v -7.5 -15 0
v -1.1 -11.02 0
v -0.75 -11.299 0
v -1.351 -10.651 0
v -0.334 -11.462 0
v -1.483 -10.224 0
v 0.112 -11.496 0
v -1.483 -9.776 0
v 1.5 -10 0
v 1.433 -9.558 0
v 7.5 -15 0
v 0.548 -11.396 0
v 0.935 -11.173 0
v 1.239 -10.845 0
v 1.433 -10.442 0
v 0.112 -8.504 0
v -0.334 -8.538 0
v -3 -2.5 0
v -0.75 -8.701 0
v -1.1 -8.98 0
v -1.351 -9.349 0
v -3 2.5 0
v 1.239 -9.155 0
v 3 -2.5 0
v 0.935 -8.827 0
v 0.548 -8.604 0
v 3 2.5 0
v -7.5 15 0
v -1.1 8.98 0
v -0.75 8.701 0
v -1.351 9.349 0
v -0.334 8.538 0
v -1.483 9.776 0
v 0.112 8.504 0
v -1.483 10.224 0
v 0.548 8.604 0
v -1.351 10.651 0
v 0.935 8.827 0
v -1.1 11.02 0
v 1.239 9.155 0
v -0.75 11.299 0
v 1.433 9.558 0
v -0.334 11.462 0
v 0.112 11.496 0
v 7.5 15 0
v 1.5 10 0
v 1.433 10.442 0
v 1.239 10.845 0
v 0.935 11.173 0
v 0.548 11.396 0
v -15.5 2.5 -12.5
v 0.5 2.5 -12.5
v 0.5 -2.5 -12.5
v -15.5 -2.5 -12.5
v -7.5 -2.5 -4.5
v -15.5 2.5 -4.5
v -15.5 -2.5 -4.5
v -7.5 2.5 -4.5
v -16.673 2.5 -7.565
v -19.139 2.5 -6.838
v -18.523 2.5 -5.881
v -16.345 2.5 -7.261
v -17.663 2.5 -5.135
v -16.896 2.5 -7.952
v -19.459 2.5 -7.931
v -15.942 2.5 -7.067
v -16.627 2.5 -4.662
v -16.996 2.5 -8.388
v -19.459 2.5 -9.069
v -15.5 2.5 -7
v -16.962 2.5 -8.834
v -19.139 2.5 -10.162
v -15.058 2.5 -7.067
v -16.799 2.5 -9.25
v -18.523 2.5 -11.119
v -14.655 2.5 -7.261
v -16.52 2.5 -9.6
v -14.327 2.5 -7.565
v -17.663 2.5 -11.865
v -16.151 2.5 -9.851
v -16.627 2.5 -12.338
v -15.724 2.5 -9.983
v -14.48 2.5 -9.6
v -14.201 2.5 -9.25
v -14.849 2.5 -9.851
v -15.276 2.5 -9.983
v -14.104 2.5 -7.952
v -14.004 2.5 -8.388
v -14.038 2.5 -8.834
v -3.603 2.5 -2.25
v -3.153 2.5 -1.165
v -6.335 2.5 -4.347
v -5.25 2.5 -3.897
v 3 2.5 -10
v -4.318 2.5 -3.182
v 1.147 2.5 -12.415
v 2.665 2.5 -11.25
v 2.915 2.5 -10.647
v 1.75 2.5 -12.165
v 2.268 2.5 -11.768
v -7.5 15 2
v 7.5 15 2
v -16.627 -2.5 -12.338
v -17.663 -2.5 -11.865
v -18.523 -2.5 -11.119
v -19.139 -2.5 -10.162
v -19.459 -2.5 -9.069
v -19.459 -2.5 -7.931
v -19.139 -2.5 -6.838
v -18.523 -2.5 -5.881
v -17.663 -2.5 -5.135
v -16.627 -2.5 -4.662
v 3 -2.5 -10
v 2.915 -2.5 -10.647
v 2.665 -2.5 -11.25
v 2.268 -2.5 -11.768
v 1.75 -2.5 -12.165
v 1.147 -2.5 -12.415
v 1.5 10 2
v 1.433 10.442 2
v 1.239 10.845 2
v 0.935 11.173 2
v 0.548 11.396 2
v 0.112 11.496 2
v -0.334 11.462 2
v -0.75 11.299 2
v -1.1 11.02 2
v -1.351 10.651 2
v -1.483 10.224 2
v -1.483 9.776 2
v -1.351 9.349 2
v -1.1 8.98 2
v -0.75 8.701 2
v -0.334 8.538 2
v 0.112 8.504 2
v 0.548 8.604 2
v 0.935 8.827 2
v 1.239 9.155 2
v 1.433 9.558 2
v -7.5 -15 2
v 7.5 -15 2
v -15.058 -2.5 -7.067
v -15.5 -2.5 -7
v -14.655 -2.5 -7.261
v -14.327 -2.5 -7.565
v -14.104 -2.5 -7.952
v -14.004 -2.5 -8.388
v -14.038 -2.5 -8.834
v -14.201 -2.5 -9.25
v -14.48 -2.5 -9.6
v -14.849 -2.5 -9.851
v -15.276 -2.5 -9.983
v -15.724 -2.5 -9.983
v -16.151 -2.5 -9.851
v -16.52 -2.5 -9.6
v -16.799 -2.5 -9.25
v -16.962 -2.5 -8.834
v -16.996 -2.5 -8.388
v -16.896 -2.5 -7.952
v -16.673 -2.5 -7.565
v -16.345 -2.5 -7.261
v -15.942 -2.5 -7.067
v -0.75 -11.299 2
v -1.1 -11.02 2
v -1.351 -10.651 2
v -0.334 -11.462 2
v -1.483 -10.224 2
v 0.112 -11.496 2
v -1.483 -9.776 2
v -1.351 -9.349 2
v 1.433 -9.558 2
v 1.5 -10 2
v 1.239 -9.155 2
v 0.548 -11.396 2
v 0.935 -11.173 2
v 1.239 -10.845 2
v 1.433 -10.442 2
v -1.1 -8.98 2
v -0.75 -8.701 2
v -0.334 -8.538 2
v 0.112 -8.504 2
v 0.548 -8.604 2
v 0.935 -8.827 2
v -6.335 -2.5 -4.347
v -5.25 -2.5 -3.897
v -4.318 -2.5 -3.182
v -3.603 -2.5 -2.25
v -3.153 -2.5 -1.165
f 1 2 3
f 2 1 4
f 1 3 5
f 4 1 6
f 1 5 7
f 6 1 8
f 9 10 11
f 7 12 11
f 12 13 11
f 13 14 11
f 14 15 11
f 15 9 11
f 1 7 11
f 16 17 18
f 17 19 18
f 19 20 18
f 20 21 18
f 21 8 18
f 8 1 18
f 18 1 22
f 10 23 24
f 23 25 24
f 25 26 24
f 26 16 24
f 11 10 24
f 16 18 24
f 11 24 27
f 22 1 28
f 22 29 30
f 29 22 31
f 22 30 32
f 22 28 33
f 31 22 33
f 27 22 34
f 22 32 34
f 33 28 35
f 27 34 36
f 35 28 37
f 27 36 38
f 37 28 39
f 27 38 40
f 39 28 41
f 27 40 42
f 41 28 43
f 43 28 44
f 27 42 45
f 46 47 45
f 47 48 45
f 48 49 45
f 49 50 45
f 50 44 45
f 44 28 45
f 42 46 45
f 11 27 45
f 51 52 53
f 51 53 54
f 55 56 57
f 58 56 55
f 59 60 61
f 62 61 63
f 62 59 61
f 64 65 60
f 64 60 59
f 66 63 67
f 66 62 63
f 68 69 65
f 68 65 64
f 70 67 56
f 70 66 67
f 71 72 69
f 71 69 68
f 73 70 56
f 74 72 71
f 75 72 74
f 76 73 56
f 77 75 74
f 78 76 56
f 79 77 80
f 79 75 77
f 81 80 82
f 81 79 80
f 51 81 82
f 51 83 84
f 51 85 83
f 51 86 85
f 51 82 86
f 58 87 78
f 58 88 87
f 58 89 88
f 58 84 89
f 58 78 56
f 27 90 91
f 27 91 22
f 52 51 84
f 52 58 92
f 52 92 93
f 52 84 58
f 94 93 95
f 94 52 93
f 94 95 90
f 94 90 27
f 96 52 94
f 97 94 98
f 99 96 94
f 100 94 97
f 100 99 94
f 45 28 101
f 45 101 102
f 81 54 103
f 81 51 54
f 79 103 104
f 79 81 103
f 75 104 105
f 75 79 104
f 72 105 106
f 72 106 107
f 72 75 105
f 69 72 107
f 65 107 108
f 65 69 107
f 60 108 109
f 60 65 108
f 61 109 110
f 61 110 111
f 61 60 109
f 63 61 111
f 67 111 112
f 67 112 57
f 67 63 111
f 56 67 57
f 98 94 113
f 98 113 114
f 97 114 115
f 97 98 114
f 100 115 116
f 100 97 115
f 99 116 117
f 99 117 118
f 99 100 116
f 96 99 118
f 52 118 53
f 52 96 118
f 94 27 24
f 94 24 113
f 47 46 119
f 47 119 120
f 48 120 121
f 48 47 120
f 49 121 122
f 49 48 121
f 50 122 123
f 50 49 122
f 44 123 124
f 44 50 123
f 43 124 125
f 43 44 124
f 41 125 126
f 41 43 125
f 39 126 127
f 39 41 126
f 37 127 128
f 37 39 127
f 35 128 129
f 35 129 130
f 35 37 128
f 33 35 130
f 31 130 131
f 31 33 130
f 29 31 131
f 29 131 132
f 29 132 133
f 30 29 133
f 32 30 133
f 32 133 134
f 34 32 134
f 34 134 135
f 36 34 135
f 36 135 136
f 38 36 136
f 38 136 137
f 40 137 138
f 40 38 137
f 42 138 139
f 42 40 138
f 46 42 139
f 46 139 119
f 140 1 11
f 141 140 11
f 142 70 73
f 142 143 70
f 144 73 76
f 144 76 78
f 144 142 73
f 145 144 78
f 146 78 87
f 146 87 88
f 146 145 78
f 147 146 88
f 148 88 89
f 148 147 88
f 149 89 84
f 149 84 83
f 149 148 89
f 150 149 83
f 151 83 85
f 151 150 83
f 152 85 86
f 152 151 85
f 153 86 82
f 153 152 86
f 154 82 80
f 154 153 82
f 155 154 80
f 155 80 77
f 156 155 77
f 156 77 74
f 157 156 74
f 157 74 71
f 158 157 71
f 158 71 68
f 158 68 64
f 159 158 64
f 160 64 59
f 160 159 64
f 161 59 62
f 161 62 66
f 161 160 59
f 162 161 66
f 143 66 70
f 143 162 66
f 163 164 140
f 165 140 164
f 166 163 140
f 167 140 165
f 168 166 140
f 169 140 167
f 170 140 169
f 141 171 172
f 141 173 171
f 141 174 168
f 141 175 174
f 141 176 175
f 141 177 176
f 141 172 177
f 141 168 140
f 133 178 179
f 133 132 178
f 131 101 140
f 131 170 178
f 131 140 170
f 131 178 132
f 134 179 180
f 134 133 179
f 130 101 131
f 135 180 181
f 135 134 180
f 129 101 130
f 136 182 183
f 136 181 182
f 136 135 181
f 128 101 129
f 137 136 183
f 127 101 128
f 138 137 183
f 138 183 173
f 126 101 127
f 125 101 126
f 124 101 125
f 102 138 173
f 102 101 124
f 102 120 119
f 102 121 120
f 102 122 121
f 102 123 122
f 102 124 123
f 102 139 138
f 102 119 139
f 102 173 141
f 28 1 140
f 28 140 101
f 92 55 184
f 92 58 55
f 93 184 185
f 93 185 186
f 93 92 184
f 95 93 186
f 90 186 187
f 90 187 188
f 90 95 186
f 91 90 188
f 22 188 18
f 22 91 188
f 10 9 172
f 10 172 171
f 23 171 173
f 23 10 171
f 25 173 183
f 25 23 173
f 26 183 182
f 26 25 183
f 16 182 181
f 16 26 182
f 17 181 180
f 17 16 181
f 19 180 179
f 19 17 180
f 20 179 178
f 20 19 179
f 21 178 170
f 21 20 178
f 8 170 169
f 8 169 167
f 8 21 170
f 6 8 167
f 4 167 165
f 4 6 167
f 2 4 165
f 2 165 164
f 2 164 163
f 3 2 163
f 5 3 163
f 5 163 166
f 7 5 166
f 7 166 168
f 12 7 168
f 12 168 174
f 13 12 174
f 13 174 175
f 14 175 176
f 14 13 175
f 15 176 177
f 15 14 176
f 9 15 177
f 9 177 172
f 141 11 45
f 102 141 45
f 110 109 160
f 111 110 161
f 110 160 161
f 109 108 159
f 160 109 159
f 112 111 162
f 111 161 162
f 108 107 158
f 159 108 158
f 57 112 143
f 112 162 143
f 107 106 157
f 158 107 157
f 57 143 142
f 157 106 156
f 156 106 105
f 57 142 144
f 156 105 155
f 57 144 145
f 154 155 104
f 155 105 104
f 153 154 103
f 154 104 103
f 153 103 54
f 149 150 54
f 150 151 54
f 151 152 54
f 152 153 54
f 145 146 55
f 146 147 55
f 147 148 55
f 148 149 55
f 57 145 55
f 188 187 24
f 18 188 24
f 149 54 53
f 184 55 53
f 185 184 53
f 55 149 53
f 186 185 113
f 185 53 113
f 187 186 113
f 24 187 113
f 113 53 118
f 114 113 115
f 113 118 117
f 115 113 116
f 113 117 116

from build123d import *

# Parameters (mm, degrees)
SKETCH1_W           = 15
SKETCH1_H           = 30
SKETCH1_R           = 1.5
BOSS_EXTRUDE1_DEPTH = 2
SKETCH2_R           = 1.5
BOSS_EXTRUDE2_DEPTH = 2.5


with BuildPart() as part:
    # Sketch1 → Boss-Extrude1 (new body)
    with BuildSketch(Plane.XY):
        Rectangle(SKETCH1_W, SKETCH1_H)
        with Locations((0, 10)):
            Circle(SKETCH1_R, mode=Mode.SUBTRACT)
        with Locations((0, -10)):
            Circle(SKETCH1_R, mode=Mode.SUBTRACT)
    extrude(amount=BOSS_EXTRUDE1_DEPTH)

    # Sketch2 → Boss-Extrude2 (add, symmetric)
    with BuildSketch(Plane(origin=(0, 0, 0), x_dir=(1, 0, 0), z_dir=(0, 1, 0))):
        with BuildLine():
            Line((-3, 0), (3, 0))
            Line((3, 0), (3, 10))
            ThreePointArc((3, 10), (2.267766953, 11.767766953), (0.5, 12.5))
            Line((0.5, 12.5), (-15.5, 12.5))
            ThreePointArc((-15.5, 12.5), (-19.5, 8.5), (-15.5, 4.5))
            Line((-15.5, 4.5), (-7.5, 4.5))
            ThreePointArc((-7.5, 4.5), (-4.318019485, 3.181980515), (-3, 0))
        make_face()
        with Locations(Location((-15.5, 8.5, 0), (0, 0, 270))):
            Circle(SKETCH2_R, mode=Mode.SUBTRACT)
    extrude(amount=BOSS_EXTRUDE2_DEPTH, both=True)


solid = part.part
